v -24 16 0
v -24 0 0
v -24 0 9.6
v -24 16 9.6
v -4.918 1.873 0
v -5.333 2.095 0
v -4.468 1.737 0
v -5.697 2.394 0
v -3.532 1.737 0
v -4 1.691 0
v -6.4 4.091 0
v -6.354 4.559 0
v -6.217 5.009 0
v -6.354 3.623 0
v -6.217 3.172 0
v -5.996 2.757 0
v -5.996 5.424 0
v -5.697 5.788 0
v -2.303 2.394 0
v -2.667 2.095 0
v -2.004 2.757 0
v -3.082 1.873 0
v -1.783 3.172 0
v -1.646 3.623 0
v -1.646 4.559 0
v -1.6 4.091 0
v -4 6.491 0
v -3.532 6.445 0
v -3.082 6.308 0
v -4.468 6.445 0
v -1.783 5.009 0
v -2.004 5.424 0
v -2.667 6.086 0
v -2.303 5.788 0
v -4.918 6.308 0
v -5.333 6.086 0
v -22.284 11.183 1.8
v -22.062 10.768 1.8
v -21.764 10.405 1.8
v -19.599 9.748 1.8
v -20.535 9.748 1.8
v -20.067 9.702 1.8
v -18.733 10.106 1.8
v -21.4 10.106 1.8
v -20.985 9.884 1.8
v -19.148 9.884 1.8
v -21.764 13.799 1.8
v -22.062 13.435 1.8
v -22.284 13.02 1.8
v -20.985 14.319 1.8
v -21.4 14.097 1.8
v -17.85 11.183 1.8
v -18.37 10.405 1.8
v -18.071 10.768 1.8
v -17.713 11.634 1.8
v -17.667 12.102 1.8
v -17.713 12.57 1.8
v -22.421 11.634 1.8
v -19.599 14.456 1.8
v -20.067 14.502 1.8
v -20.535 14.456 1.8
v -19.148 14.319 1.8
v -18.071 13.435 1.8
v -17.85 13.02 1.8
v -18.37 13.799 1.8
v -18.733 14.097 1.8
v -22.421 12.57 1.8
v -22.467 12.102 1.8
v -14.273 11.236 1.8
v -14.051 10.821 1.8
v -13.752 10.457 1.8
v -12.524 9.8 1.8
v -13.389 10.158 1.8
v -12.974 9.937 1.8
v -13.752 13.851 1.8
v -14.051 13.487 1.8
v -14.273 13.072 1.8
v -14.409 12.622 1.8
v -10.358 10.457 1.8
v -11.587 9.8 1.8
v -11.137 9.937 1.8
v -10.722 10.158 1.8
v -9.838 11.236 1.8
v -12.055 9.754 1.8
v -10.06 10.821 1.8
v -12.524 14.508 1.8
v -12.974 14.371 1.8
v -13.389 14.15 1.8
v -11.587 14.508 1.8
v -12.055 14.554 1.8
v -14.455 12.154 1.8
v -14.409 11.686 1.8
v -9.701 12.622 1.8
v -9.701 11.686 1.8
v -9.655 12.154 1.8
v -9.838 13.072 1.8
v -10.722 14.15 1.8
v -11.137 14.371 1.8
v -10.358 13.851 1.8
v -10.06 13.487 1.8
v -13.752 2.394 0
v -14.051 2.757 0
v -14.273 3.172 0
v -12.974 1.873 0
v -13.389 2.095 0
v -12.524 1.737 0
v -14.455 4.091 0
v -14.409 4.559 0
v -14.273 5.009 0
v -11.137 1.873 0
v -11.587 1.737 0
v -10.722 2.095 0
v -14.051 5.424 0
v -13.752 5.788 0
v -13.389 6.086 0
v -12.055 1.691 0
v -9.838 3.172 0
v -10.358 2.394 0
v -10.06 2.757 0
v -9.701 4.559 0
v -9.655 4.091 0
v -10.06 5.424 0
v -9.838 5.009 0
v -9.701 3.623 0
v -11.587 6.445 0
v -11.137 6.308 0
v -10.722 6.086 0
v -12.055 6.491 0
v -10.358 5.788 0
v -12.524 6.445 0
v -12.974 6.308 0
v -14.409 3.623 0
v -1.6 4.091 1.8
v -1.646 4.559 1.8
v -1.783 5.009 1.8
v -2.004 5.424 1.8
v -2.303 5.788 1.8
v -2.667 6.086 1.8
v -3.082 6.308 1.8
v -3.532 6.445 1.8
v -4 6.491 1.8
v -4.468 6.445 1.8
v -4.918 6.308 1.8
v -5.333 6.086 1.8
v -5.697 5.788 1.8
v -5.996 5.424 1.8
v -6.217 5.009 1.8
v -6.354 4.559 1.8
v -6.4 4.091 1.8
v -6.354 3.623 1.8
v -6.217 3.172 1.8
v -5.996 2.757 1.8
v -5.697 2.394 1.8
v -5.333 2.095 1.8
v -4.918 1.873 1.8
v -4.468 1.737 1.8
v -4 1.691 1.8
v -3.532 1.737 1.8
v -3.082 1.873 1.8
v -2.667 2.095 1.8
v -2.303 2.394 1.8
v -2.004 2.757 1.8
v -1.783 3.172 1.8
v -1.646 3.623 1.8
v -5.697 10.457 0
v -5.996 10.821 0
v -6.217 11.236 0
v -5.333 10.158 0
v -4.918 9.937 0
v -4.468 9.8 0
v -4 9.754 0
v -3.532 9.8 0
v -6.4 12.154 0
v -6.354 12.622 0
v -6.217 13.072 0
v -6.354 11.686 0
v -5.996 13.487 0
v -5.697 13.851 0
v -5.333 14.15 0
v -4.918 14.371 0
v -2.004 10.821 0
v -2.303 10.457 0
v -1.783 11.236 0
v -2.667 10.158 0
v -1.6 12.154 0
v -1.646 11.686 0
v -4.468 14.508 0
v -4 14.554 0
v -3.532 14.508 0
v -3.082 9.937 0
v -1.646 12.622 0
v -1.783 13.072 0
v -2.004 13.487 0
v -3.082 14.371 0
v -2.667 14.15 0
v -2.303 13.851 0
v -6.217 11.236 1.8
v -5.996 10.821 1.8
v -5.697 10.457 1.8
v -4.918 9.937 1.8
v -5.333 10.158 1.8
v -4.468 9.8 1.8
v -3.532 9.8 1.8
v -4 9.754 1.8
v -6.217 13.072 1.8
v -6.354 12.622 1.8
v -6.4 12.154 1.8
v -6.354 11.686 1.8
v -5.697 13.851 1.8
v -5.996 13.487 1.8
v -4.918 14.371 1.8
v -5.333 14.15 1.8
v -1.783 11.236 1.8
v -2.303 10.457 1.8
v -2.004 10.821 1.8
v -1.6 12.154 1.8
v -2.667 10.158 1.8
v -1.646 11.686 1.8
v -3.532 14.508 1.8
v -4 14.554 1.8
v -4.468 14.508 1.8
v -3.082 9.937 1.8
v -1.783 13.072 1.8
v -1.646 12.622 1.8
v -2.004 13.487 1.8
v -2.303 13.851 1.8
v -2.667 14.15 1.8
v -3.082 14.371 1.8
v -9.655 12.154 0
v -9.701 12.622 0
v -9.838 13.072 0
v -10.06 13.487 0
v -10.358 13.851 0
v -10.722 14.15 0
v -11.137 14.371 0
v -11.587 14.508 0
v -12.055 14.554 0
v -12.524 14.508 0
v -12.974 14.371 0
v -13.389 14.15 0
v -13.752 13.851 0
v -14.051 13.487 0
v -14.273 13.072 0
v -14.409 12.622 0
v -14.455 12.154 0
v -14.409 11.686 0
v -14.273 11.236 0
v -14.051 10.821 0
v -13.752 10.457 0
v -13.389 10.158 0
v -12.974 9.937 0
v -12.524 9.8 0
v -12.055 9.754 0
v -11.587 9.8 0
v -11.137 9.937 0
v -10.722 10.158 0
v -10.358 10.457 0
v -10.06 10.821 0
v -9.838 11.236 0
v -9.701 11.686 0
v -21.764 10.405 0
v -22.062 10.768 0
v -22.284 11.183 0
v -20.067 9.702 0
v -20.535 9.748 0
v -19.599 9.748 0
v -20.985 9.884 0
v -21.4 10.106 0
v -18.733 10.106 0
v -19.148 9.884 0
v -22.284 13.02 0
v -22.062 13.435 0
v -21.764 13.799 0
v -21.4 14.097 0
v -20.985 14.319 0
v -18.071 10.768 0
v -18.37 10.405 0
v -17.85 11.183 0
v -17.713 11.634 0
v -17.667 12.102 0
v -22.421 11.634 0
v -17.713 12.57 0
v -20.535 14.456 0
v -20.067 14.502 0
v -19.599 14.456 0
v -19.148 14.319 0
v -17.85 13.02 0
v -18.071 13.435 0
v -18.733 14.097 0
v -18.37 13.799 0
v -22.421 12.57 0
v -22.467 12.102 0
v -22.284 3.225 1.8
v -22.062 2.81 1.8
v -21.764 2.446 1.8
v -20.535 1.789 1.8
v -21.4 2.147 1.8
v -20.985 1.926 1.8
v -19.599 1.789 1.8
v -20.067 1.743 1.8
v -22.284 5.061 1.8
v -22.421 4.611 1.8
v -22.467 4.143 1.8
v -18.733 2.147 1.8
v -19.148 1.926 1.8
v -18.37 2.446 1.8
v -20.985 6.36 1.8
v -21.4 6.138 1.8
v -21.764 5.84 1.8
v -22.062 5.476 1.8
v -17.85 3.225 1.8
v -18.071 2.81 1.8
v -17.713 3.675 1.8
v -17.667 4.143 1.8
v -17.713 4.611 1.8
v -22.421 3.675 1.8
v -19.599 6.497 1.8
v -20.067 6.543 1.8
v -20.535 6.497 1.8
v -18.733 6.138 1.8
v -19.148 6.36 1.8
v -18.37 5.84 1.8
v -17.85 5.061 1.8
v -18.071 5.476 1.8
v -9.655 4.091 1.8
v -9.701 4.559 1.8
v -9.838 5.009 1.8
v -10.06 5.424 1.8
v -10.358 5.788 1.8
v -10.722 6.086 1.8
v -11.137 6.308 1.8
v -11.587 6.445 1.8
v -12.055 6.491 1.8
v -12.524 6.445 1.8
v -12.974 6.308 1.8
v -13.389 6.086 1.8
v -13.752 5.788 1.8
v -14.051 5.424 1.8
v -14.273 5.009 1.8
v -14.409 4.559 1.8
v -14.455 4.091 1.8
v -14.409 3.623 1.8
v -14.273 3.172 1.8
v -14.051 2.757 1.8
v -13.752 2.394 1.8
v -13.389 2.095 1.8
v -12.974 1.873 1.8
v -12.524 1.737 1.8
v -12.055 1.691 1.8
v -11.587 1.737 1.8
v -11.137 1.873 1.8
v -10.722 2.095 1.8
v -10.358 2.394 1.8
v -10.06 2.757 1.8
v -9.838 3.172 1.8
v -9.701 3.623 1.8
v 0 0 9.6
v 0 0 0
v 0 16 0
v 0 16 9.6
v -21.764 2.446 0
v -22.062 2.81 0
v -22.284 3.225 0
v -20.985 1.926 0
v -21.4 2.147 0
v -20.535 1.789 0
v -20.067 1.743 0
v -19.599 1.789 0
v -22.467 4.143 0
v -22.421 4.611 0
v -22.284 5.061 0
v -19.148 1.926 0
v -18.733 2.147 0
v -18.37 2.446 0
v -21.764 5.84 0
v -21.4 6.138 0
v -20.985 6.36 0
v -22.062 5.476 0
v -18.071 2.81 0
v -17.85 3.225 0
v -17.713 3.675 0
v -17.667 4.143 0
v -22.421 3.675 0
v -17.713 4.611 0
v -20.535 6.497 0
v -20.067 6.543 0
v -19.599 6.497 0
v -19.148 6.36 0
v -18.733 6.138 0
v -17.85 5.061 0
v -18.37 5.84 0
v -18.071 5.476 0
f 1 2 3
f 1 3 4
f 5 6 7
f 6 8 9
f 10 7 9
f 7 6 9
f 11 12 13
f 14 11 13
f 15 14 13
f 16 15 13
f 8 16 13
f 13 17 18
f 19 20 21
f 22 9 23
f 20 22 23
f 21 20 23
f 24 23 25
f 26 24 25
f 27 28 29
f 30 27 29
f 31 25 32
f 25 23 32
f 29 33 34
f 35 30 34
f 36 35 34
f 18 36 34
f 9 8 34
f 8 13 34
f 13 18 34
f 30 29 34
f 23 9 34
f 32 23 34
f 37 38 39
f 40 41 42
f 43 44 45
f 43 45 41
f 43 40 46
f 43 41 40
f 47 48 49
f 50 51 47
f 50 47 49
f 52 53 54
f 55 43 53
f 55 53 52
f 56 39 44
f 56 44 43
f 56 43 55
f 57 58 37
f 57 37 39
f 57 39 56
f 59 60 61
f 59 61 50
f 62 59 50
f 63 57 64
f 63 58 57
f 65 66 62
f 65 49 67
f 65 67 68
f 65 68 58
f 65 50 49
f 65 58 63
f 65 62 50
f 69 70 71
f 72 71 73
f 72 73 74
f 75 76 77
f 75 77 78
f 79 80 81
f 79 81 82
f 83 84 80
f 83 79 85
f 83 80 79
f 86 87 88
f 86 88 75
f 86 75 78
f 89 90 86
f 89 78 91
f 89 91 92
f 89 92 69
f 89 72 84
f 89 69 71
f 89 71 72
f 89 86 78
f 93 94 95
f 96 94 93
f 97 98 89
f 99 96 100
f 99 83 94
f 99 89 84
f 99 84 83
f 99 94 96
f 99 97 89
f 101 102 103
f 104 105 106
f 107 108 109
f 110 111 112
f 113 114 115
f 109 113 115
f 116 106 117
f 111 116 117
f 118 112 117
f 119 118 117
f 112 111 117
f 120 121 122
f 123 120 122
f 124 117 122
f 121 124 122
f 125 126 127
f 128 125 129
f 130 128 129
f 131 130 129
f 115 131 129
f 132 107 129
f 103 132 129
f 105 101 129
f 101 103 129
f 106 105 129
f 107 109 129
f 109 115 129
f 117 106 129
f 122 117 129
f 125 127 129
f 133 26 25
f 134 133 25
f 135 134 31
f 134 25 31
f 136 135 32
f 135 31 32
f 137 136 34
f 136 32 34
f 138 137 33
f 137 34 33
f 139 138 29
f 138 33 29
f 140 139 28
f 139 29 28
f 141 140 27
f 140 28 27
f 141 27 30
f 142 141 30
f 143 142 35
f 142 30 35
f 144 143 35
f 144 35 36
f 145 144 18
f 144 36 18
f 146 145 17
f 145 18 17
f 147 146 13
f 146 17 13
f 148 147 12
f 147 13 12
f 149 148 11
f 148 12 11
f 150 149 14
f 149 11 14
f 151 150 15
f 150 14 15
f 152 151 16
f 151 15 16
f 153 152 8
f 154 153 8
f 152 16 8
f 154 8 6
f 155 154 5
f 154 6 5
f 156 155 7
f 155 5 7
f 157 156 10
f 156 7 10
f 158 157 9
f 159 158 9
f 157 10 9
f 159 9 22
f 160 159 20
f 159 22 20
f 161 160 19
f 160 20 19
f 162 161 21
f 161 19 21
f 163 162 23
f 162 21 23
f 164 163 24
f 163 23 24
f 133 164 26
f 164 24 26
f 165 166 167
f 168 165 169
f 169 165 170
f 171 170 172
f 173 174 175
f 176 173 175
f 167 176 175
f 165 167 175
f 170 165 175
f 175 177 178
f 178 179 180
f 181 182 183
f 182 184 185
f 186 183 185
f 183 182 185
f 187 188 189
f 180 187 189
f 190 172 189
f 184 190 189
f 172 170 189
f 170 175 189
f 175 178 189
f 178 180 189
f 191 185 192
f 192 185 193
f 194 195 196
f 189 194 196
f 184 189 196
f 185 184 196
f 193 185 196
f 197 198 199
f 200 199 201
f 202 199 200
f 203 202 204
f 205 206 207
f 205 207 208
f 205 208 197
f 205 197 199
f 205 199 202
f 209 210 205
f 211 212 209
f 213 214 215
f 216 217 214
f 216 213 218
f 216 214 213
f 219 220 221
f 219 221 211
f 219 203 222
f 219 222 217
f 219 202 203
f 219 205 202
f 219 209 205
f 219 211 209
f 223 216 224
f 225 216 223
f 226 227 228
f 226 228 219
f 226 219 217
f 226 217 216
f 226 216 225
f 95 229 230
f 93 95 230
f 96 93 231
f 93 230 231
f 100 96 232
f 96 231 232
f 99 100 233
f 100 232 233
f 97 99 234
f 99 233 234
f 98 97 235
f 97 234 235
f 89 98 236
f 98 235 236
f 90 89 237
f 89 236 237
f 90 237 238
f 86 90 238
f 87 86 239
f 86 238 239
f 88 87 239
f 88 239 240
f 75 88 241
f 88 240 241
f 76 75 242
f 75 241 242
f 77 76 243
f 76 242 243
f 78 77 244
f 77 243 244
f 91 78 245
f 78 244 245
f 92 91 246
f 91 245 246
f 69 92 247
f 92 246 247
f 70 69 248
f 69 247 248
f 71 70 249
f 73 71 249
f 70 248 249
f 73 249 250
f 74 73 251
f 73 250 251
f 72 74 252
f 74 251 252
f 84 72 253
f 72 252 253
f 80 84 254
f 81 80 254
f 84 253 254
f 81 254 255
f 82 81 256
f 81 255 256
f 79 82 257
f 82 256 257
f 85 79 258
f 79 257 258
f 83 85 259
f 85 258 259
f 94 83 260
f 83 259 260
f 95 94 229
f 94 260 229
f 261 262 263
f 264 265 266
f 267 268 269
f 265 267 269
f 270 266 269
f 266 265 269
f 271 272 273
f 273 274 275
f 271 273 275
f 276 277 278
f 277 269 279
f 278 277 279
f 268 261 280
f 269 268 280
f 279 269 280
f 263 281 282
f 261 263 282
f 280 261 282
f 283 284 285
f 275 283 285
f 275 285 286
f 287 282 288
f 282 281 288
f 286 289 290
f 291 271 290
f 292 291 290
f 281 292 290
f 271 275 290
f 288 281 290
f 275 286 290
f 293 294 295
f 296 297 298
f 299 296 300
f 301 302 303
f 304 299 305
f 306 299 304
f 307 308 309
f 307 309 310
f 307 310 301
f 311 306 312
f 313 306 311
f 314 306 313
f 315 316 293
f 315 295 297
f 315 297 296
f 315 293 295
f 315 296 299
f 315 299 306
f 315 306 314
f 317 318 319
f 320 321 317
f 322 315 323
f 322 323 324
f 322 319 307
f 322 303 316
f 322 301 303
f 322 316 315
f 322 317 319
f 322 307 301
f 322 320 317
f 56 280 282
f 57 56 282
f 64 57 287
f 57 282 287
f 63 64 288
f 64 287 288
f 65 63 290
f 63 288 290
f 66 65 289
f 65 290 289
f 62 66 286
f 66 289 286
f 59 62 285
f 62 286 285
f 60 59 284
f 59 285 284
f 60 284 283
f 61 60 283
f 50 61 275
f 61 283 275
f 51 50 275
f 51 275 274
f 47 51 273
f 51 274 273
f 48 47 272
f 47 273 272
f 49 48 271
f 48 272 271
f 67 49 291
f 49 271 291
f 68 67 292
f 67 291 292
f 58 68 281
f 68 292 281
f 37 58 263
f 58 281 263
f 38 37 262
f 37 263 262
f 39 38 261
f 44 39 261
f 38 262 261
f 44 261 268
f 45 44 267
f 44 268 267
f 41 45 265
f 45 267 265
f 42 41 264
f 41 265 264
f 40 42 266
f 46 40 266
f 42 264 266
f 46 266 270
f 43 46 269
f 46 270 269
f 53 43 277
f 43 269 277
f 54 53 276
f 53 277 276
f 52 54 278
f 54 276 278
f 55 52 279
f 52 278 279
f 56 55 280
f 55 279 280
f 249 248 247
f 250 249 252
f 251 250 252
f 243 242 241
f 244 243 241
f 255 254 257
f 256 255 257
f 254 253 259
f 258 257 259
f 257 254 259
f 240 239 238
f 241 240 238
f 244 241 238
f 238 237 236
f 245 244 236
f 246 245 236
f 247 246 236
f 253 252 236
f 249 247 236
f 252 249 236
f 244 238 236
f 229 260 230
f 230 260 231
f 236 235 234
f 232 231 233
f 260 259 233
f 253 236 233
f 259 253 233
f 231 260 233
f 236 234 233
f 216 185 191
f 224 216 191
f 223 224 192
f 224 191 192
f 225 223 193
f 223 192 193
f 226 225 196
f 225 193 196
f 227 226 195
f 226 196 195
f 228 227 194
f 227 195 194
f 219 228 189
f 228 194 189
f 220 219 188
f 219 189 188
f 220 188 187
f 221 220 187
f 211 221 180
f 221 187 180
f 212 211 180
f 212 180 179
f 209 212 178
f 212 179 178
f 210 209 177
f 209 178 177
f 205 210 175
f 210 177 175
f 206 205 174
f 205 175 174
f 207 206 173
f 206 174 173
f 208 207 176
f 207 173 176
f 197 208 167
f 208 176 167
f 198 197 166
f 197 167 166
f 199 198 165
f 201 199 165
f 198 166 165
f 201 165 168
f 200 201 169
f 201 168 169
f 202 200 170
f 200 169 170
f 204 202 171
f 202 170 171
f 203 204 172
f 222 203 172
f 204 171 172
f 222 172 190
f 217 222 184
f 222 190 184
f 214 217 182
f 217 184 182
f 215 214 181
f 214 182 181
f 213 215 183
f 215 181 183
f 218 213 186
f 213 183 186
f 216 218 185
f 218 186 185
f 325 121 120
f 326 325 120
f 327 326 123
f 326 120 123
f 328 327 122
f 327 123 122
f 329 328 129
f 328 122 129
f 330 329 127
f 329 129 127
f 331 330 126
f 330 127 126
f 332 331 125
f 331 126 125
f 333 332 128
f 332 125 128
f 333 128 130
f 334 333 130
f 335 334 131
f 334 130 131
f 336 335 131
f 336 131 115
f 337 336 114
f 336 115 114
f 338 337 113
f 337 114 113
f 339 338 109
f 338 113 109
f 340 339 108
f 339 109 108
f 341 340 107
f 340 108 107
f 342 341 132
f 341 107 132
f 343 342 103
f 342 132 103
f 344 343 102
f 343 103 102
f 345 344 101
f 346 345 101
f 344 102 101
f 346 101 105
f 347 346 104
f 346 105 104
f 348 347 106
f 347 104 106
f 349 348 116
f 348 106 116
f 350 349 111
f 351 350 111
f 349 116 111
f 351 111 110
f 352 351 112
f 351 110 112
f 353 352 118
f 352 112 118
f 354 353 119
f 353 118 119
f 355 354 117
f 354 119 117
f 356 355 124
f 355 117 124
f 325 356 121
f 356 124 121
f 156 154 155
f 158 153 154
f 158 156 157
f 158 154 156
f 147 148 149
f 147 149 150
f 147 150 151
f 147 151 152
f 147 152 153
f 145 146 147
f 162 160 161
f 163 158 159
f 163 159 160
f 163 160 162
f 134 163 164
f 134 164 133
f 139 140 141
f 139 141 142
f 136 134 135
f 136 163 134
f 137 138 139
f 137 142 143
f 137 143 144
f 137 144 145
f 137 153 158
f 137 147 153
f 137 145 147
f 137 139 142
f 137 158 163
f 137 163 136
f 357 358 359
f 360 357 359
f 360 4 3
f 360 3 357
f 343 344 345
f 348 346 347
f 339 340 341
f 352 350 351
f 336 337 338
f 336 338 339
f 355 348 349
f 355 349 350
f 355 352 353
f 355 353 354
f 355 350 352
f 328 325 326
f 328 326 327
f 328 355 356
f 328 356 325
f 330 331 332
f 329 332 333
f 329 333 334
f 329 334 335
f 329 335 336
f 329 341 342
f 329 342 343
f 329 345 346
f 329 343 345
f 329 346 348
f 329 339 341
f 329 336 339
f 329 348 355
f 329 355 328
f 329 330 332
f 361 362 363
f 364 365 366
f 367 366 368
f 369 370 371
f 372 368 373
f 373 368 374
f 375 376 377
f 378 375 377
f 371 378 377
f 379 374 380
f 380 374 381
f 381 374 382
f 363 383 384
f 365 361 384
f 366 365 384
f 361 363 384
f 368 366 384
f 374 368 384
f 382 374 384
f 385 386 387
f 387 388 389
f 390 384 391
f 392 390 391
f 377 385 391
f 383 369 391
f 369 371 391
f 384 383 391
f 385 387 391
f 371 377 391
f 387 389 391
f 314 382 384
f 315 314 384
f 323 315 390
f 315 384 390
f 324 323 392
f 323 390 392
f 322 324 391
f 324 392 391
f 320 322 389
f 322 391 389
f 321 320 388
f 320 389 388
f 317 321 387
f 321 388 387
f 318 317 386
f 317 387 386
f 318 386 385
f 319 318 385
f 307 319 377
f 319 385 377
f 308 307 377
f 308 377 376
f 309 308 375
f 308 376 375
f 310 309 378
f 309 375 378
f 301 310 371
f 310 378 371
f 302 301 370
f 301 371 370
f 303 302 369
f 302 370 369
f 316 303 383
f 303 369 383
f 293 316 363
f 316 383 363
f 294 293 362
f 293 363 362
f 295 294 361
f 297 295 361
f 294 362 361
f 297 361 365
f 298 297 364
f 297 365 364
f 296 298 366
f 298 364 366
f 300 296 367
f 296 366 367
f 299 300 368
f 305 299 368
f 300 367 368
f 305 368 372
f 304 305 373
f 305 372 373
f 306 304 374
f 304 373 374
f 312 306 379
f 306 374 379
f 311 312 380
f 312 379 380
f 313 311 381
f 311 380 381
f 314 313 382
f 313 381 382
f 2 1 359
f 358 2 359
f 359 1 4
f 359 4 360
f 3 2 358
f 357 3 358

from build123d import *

# Parameters (mm, degrees)
F0_W     = 24
F0_H     = 16
F1_DEPTH = 9.6
F2_R     = 2.4
F3_DEPTH = 1.8


with BuildPart() as f1:
    # F0 (on Top) → F1 (new body)
    with BuildSketch(Plane.XY):
        with Locations((-12, 8)):
            Rectangle(F0_W, F0_H)
    extrude(amount=F1_DEPTH)


with BuildPart() as f3:
    # F2 (on Top) → F3 (new body)
    with BuildSketch(Plane.XY):
        with Locations((-4, 12.153973)):
            Circle(F2_R)
        with Locations((-12.05536, 12.153973)):
            Circle(F2_R)
        with Locations((-20.066822, 12.10175)):
            Circle(F2_R)
        with Locations((-20.066822, 4.142956)):
            Circle(F2_R)
        with Locations((-12.05536, 4.090733)):
            Circle(F2_R)
        with Locations((-4, 4.090733)):
            Circle(F2_R)
    extrude(amount=F3_DEPTH)


solid = Compound([f1.part, f3.part])
